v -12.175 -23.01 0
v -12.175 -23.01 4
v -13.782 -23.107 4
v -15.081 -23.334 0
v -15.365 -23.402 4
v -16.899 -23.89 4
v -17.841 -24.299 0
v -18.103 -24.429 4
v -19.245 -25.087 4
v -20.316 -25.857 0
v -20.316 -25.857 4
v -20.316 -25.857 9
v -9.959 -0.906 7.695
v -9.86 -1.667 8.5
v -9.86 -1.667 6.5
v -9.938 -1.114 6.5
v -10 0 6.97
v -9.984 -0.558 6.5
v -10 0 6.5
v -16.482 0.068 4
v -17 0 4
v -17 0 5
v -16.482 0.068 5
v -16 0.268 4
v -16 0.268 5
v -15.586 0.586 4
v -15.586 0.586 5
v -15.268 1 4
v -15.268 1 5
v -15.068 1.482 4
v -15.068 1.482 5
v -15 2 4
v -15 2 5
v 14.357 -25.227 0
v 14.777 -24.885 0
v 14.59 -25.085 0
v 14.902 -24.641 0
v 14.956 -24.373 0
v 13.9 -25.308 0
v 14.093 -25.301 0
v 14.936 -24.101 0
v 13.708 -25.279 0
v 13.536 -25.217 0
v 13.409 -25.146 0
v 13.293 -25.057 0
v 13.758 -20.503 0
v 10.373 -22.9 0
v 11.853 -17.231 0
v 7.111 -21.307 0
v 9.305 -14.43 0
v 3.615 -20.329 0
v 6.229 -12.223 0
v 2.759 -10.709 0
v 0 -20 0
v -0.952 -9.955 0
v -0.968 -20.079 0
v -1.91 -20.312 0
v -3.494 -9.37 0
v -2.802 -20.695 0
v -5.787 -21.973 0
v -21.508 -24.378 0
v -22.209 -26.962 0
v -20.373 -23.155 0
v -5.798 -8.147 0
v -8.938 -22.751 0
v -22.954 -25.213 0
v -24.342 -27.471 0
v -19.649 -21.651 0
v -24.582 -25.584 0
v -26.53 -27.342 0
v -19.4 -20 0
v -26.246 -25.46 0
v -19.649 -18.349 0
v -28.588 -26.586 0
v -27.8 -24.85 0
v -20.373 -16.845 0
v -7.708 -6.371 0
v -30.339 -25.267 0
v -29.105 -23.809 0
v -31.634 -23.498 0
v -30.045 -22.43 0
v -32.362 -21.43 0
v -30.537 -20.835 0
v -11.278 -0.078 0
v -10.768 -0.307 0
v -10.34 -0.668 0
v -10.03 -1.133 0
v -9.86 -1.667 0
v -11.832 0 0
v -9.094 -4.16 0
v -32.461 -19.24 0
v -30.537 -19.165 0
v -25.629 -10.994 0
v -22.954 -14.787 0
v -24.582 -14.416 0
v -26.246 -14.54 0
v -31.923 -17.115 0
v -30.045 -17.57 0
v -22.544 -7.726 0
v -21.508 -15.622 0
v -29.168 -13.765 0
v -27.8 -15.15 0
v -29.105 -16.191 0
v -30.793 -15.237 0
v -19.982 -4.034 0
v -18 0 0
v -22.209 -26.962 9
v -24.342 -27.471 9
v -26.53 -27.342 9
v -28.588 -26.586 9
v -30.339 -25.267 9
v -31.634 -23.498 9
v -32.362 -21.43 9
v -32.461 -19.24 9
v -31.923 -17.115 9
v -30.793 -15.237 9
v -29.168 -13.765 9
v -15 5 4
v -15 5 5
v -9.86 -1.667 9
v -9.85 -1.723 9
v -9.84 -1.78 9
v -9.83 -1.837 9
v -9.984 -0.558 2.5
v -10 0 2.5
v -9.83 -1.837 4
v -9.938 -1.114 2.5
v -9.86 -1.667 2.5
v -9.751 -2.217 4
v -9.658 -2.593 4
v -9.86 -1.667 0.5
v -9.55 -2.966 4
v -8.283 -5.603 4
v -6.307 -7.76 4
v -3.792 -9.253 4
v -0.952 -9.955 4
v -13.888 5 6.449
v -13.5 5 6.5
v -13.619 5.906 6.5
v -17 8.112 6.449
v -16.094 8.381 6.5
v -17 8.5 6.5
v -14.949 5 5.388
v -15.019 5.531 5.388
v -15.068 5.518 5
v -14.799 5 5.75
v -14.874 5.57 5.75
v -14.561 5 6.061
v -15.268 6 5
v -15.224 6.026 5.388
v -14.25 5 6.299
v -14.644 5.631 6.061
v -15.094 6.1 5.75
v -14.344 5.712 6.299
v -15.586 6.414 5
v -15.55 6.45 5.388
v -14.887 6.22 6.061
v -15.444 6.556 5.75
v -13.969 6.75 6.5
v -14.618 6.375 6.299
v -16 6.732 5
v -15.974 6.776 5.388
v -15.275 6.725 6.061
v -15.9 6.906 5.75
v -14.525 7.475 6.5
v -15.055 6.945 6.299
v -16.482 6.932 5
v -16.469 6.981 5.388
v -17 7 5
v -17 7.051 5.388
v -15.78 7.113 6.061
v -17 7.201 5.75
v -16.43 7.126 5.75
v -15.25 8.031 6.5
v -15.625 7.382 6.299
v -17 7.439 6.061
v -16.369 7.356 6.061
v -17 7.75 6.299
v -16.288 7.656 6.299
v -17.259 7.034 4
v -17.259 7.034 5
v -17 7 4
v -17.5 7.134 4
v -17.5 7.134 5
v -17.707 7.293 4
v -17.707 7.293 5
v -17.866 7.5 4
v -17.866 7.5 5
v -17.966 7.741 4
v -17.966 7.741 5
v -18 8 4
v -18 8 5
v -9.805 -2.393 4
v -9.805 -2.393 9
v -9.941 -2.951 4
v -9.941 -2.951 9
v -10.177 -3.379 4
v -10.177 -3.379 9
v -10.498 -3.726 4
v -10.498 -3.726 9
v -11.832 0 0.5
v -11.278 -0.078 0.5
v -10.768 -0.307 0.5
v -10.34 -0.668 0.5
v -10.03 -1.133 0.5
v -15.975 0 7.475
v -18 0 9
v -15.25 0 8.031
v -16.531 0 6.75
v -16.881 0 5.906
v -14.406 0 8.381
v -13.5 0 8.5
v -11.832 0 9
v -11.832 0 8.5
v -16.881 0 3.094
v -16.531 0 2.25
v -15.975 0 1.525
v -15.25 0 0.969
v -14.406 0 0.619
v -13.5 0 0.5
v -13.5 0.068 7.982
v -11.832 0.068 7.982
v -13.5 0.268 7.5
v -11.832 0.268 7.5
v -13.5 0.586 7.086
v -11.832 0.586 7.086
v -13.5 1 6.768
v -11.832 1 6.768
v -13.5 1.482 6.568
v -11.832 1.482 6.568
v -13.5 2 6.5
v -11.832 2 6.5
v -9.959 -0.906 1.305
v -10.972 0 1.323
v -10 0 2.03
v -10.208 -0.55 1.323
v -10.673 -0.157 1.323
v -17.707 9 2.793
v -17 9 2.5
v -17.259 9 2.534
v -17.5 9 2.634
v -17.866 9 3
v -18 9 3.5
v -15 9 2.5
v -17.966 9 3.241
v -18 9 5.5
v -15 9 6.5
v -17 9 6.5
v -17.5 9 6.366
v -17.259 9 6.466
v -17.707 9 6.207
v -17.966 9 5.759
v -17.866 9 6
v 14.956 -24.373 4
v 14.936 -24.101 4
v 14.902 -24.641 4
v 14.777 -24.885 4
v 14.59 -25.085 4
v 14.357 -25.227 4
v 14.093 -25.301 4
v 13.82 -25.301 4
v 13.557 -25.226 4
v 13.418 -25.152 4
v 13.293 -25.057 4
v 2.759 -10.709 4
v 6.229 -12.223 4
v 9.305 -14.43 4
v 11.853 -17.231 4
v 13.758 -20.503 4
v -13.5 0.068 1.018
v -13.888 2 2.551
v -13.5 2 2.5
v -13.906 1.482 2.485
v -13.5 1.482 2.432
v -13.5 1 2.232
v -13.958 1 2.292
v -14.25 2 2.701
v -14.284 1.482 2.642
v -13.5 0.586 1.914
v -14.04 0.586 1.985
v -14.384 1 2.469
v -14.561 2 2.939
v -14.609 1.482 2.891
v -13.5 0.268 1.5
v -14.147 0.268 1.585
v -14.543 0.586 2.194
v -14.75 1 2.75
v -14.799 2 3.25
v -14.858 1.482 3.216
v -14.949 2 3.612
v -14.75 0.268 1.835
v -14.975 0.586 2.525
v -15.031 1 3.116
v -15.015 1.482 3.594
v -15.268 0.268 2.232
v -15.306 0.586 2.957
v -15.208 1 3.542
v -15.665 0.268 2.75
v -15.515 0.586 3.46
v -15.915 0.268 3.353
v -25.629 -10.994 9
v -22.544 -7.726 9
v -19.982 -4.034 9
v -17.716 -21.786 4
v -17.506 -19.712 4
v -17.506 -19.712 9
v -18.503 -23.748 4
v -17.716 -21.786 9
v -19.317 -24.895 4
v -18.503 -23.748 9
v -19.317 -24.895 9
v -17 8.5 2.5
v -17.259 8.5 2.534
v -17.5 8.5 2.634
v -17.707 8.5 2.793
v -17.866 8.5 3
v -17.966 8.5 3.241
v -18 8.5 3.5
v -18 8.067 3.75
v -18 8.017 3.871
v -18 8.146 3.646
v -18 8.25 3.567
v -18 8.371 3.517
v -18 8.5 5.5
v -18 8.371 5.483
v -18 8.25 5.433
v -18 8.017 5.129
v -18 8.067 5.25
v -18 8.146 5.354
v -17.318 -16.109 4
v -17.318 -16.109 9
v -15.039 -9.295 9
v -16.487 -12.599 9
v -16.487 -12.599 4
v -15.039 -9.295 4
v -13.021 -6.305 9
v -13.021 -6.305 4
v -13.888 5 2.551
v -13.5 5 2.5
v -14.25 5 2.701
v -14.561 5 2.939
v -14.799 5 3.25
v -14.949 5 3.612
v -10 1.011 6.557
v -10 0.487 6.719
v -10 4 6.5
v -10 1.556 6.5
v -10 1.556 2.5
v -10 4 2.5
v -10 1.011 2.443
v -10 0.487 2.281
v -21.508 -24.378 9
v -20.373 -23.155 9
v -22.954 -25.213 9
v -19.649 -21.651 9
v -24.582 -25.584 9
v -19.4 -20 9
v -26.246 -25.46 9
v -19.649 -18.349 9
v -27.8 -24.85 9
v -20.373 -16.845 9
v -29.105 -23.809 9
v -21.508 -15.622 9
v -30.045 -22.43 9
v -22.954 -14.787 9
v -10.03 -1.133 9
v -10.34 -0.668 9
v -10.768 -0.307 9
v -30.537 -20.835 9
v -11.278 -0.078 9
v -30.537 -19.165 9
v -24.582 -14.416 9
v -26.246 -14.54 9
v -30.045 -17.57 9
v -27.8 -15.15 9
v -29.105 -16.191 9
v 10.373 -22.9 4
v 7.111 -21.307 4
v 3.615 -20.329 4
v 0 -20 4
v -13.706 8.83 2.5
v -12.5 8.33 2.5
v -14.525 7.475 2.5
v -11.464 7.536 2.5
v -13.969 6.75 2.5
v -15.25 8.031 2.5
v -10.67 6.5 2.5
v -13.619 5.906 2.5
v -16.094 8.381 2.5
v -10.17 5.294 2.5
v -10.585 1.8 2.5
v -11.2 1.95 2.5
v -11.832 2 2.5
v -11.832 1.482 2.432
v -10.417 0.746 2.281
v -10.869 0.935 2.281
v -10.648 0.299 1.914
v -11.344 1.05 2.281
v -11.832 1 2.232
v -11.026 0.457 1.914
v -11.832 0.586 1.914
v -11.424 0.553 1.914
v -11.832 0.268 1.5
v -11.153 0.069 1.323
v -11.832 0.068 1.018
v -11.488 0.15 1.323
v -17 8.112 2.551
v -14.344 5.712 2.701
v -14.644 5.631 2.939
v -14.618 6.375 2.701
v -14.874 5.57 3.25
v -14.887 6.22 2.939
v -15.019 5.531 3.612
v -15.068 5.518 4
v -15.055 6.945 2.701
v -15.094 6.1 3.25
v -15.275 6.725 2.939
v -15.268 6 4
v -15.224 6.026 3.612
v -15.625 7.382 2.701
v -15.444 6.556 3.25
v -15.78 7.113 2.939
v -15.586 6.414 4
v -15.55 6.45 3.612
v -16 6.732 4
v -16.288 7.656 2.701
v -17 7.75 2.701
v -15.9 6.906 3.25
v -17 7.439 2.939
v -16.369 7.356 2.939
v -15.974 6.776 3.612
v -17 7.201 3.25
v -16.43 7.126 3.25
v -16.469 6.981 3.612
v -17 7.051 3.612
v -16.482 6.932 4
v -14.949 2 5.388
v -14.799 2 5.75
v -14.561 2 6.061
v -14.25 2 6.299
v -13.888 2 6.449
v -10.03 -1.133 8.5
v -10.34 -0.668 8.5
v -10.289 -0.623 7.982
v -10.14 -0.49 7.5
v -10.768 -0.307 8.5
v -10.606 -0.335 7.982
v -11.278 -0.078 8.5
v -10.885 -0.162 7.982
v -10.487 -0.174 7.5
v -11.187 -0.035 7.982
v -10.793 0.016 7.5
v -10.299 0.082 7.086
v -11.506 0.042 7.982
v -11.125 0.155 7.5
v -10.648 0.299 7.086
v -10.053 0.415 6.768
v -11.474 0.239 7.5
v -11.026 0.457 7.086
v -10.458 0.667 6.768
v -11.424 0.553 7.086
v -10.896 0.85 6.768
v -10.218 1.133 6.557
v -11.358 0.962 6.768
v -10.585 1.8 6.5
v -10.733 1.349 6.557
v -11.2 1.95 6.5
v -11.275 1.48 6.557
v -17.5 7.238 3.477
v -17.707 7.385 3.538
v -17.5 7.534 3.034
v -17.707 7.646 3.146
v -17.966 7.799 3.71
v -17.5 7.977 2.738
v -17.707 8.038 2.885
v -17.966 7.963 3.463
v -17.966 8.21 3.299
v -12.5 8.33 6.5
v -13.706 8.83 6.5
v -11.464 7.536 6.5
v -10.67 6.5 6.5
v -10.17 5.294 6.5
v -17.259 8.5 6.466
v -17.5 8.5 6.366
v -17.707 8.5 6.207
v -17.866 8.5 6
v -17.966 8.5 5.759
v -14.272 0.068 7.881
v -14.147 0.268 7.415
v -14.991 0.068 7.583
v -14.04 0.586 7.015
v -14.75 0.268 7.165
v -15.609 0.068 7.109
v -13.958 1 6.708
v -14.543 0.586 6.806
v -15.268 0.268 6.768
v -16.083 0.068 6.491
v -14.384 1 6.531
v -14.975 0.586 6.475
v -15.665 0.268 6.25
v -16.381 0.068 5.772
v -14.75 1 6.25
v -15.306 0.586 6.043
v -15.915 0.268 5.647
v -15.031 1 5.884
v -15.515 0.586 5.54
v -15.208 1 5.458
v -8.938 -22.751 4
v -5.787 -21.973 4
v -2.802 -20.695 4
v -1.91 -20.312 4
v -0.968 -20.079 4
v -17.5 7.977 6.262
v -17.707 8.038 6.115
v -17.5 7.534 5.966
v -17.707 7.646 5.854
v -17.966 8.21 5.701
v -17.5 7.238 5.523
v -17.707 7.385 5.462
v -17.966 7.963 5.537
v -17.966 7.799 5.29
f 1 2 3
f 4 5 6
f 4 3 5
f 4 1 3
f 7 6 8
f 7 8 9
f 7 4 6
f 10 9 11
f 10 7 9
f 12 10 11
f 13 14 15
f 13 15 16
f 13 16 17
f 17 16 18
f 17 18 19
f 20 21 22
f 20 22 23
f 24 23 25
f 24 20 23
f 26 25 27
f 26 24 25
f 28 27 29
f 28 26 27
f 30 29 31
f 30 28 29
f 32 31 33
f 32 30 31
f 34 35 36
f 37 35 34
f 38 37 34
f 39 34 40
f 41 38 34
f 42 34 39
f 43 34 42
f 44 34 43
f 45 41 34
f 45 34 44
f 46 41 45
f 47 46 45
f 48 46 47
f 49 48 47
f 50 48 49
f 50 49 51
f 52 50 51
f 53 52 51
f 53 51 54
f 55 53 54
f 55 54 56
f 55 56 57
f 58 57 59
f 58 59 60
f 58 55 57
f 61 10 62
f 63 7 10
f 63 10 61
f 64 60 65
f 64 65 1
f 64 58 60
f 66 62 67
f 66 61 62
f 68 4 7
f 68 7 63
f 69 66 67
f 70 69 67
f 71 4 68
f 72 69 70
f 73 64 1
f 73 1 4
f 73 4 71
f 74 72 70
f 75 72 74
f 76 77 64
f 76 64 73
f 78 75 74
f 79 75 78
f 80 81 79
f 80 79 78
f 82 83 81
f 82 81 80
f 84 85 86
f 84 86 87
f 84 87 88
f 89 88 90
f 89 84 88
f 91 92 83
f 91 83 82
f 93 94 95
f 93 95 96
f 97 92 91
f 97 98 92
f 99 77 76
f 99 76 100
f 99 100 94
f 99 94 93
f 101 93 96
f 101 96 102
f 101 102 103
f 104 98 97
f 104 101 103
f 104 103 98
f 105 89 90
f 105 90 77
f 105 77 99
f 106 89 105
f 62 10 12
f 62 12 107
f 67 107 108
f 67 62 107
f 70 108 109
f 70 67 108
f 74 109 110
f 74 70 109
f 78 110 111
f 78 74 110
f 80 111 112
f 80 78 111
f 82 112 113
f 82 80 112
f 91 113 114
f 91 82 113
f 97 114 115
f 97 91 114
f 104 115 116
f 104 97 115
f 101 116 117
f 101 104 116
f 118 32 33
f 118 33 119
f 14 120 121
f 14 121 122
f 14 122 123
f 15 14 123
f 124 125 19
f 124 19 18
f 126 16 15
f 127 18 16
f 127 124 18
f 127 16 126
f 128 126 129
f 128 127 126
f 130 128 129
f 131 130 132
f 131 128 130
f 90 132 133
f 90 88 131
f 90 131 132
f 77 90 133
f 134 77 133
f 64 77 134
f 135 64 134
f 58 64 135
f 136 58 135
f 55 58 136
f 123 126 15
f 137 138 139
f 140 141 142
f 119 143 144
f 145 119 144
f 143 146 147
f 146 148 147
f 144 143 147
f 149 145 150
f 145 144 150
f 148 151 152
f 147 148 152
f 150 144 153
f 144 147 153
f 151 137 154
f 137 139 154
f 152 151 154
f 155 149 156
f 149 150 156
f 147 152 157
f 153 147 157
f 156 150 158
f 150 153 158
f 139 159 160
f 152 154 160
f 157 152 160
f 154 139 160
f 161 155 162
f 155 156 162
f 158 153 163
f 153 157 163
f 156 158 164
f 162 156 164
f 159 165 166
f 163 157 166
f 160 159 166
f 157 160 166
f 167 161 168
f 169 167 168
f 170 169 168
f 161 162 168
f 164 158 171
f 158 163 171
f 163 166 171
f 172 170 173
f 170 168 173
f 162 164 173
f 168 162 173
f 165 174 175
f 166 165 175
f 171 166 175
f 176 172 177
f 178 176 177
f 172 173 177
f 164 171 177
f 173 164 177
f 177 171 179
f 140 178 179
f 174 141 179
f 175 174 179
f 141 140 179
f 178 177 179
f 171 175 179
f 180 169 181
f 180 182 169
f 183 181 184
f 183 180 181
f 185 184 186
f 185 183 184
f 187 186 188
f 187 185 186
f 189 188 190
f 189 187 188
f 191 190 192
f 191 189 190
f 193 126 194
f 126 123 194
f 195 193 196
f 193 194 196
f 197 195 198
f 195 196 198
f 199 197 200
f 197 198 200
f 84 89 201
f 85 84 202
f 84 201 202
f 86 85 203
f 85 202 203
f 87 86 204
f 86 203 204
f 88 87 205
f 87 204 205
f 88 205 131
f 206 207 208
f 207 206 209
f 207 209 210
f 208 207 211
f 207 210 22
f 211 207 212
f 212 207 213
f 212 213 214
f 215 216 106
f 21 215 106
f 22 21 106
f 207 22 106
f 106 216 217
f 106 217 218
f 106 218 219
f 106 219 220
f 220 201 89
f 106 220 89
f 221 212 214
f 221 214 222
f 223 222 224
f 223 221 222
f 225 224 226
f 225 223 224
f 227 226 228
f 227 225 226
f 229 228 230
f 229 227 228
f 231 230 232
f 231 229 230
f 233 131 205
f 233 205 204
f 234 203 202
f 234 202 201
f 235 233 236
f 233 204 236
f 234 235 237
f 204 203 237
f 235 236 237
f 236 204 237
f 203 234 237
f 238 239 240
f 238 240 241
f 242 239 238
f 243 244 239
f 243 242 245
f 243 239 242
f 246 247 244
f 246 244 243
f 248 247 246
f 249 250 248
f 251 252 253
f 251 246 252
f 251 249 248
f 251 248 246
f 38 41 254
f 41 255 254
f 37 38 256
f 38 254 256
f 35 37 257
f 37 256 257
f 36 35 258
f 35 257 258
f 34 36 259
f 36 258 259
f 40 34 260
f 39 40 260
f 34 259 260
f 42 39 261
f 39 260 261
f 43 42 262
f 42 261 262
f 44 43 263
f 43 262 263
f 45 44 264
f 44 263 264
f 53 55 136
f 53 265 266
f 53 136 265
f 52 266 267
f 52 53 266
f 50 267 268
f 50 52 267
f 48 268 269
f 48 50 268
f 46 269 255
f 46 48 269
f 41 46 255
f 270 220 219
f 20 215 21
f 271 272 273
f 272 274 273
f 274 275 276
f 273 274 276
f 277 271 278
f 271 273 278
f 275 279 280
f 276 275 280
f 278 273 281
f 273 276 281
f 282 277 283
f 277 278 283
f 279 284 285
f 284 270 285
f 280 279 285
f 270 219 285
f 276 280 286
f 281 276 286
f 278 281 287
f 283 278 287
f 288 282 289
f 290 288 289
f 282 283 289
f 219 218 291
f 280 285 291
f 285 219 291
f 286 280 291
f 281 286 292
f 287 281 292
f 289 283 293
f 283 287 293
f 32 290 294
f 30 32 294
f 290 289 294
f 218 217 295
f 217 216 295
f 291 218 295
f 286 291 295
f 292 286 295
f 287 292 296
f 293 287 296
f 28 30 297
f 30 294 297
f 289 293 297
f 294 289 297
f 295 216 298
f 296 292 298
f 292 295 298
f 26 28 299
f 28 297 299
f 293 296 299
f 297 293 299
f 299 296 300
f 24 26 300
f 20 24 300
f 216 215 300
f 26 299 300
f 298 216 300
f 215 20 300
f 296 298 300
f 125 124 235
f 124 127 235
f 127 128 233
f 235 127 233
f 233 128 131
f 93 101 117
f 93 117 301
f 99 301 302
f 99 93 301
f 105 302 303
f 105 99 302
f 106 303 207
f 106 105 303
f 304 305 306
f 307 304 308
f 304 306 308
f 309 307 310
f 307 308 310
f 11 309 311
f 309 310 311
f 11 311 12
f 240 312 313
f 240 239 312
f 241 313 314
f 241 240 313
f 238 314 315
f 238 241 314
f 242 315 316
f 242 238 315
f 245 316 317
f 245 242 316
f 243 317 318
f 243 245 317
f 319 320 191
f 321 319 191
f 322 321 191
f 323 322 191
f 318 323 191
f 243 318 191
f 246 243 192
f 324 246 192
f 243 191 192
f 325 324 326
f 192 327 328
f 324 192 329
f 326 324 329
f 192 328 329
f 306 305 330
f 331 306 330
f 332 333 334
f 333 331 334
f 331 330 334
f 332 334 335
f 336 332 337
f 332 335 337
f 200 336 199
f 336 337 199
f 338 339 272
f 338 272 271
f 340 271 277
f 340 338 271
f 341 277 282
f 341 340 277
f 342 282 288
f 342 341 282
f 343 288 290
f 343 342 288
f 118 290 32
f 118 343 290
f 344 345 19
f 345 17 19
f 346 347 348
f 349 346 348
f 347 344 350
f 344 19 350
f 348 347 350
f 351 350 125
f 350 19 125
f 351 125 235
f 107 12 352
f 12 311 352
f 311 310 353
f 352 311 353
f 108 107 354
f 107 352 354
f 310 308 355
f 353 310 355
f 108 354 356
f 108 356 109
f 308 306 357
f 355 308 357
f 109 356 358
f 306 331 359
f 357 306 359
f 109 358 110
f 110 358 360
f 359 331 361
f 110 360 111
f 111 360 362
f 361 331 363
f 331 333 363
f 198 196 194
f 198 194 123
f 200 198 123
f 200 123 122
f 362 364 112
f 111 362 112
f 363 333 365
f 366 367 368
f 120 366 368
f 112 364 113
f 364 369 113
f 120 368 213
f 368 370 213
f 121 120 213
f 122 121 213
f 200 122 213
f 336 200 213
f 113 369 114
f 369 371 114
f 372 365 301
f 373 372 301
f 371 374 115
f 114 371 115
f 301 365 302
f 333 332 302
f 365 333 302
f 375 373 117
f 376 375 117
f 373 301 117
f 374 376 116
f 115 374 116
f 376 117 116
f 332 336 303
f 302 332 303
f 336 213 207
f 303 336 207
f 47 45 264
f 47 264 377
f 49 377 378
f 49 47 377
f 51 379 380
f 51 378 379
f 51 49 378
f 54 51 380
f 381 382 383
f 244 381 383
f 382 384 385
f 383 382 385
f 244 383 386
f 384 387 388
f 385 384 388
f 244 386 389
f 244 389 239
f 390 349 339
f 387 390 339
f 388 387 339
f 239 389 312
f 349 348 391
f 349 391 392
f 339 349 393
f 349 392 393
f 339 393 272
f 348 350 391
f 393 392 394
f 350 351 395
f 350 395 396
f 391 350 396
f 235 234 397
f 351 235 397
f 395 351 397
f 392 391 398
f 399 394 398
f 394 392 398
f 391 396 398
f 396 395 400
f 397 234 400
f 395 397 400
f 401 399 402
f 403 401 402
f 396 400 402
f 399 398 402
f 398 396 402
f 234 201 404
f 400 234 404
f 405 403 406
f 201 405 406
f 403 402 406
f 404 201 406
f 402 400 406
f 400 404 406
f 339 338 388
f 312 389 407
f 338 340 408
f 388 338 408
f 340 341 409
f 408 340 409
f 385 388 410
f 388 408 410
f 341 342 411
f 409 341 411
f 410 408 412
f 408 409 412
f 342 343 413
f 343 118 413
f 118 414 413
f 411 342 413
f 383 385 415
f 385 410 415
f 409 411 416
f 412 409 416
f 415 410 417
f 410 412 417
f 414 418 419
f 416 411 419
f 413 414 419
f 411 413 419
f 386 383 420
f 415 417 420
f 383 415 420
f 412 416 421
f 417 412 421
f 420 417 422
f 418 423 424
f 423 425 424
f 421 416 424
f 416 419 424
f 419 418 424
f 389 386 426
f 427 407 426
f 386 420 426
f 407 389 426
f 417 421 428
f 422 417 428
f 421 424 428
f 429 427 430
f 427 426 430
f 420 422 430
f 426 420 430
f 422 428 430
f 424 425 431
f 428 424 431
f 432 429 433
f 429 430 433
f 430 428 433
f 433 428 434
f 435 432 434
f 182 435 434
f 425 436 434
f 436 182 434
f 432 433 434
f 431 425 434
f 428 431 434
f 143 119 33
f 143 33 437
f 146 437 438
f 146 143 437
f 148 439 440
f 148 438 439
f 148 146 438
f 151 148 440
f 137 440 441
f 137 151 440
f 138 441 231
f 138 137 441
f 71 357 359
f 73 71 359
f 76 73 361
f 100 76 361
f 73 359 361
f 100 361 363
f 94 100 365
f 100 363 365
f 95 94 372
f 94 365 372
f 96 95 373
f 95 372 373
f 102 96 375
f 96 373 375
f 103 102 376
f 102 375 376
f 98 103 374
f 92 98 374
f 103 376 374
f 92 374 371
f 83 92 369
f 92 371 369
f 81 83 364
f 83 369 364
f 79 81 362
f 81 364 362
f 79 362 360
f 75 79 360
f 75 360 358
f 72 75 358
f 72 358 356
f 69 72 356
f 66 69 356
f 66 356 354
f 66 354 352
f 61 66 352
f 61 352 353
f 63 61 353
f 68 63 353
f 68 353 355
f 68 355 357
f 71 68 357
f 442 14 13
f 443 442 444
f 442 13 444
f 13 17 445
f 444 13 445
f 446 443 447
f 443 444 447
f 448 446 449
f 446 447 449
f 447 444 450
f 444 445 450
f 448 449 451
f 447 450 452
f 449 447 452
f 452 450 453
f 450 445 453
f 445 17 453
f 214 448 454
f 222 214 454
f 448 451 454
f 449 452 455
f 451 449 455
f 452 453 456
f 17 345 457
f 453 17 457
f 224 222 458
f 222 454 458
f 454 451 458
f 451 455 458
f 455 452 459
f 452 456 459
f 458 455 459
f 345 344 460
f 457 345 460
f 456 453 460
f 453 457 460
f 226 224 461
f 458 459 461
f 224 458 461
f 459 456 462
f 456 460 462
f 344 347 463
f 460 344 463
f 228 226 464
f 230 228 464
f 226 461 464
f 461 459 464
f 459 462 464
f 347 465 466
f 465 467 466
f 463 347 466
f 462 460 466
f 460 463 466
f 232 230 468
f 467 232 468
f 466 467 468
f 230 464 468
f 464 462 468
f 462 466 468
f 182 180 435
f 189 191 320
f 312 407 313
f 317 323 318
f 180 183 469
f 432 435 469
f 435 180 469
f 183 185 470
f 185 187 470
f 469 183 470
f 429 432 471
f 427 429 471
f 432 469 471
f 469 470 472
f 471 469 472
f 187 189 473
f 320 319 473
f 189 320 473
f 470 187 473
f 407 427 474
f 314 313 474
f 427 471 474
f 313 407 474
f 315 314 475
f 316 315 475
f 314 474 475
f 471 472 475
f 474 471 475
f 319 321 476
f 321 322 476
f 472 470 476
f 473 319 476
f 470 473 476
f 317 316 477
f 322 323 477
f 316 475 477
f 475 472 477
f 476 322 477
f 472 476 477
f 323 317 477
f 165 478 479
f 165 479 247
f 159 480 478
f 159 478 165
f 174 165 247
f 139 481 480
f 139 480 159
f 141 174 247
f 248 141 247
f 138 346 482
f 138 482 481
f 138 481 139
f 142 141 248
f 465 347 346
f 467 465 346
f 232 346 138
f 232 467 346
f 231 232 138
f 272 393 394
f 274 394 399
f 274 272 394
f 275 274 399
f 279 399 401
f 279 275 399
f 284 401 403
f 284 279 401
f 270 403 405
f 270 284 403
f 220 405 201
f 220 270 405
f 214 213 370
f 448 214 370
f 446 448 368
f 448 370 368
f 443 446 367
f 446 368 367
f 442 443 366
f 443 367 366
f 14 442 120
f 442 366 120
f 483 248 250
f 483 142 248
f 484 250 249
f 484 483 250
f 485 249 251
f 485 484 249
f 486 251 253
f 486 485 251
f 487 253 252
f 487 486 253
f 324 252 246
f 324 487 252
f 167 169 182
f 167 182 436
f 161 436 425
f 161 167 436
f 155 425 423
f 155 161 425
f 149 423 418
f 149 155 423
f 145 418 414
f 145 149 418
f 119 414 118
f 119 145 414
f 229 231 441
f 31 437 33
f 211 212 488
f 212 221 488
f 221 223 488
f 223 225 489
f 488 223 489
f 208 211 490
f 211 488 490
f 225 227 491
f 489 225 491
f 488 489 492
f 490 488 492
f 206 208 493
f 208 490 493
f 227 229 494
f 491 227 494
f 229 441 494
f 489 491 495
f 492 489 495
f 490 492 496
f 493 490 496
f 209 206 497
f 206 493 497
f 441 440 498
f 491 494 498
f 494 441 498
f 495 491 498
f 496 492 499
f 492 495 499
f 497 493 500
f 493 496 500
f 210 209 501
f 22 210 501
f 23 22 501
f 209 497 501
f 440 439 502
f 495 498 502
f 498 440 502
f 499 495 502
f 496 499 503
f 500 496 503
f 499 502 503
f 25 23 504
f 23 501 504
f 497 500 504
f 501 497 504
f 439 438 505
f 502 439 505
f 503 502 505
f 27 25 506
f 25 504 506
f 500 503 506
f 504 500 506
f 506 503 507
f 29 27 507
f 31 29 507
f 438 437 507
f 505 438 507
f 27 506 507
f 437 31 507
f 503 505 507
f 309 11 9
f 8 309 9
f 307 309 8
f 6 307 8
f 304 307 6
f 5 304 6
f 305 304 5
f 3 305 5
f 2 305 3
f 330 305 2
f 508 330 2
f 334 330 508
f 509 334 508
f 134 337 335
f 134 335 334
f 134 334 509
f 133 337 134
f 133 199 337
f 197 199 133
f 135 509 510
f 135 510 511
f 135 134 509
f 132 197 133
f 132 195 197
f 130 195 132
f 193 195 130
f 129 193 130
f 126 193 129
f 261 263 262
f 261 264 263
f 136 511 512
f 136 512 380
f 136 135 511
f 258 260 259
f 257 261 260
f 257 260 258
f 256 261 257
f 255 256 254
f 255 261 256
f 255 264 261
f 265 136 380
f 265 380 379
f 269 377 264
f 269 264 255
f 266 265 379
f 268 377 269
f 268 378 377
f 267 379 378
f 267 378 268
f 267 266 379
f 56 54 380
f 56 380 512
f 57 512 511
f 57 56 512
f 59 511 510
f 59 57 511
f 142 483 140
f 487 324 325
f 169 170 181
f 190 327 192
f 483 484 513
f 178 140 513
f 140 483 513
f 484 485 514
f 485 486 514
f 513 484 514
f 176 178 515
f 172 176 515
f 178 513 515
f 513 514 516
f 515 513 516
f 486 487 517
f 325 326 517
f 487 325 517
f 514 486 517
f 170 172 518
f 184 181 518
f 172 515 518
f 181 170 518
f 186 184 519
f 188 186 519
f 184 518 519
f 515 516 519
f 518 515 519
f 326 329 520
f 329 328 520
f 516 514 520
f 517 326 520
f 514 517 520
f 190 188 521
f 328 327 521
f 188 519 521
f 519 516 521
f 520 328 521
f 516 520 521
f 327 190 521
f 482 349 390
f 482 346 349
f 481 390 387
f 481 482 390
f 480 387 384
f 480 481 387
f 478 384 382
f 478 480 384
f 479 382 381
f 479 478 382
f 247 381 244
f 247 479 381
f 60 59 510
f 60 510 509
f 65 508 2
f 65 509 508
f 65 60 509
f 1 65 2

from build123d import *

# Parameters (mm, degrees)
EXTRUDE_1_DEPTH     = 9
CUT_EXTRUDE_START   = -5
CUT_EXTRUDE_1_DEPTH = 5
SKETCH_12_W         = 2.5
SKETCH_12_H         = 7
CUT_EXTRUDE_3_DEPTH = 42.911887352
FILLET_11_R         = 2
FILLET_1_R          = 1
SKETCH_10_W         = 8
SKETCH_10_H         = 4
EXTRUDE_3_DEPTH     = 2
FILLET_5_R          = 5
FILLET_10_R         = 7.5
FILLET_14_R         = 2
FILLET_15_R         = 1.5
FILLET_16_R         = 2
FILLET_17_R         = 1
FILLET_18_R         = 2
SKETCH_11_R         = 5.6
CUT_EXTRUDE_2_DEPTH = 44.514365603


# Some blends are built 0.0001 mm under size
with BuildPart() as part:
    # Эскиз2 → Бобышка-Вытянуть1 (new body)
    with BuildSketch(Plane.XY):
        with BuildLine():
            Line((-18, 0), (-15, 0))
            Line((-15, 0), (-15, 7))
            Line((-15, 7), (-10, 7))
            Line((-10, 7), (-10, 0))
            ThreePointArc((-10, 0), (-7.39984978, -6.726233956), (-0.951555354, -9.954624172))
            ThreePointArc((-0.951555354, -9.954624172), (10.407523967, -15.498539394), (15.320888862, -27.144247806))
            ThreePointArc((15.320888862, -27.144247806), (8.452365235, -21.873844259), (0, -20))
            ThreePointArc((0, -20), (-1.44344914, -20.176216472), (-2.802111775, -20.69451514))
            ThreePointArc((-2.802111775, -20.69451514), (-7.346697493, -22.426064476), (-12.174852362, -23.009539415))
            ThreePointArc((-12.174852362, -23.009539415), (-16.488233618, -23.738589268), (-20.315570084, -25.857142338))
            ThreePointArc((-20.315570084, -25.857142338), (-31.05163084, -24.430323259), (-29.168151763, -13.764896883))
            ThreePointArc((-29.168151763, -13.764896883), (-22.544234788, -7.726123715), (-18, 0))
        make_face()
    extrude(amount=EXTRUDE_1_DEPTH)

    # Эскиз6 → Вырез-Вытянуть1 (cut)
    with BuildSketch(Plane.XY.offset(9).offset(CUT_EXTRUDE_START)):
        with BuildLine():
            ThreePointArc((-9.55, -2.96605799), (-16.390256677, -12.316180922), (-16.898984287, -23.890078556))
            ThreePointArc((-16.898984287, -23.890078556), (-14.577958647, -23.229625817), (-12.174852362, -23.009539415))
            ThreePointArc((-12.174852362, -23.009539415), (-7.346697493, -22.426064476), (-2.802111775, -20.69451514))
            ThreePointArc((-2.802111775, -20.69451514), (-1.44344914, -20.176216472), (0, -20))
            ThreePointArc((0, -20), (8.452365235, -21.873844259), (15.320888862, -27.144247806))
            ThreePointArc((15.320888862, -27.144247806), (10.407523967, -15.498539394), (-0.951555354, -9.954624172))
            ThreePointArc((-0.951555354, -9.954624172), (-6.307192762, -7.760110789), (-9.55, -2.96605799))
        make_face()
    extrude(amount=CUT_EXTRUDE_1_DEPTH, mode=Mode.SUBTRACT)

    # Эскиз12 → Вырез-Вытянуть3 (cut, through all)
    with BuildSketch(Plane.ZY.offset(15)):
        with Locations((1.25, 3.5)):
            Rectangle(SKETCH_12_W, SKETCH_12_H)
        with Locations((7.75, 3.5)):
            Rectangle(SKETCH_12_W, SKETCH_12_H)
    extrude(amount=-CUT_EXTRUDE_3_DEPTH, mode=Mode.SUBTRACT)

    # Скругление11
    fillet_11_edges = [part.edges().sort_by_distance(p)[0] for p in [
        (-10, 0, 7.75),
        (-10, 0, 1.25),
    ]]
    fillet(fillet_11_edges, radius=FILLET_11_R)

    # Скругление1
    fillet_1_edges = [part.edges().sort_by_distance(p)[0] for p in [
        (15.320888862, -27.144247806, 2),
    ]]
    fillet(fillet_1_edges, radius=FILLET_1_R)

    # Эскиз10 → Бобышка-Вытянуть3 (add)
    with BuildSketch(Plane(origin=(0, 7, 0), x_dir=(-1, 0, 0), z_dir=(0, 1, 0))):
        with Locations((14, 4.5)):
            Rectangle(SKETCH_10_W, SKETCH_10_H)
    extrude(amount=EXTRUDE_3_DEPTH)

    # Скругление5
    fillet_5_edges = [part.edges().sort_by_distance(p)[0] for p in [
        (-10, 9, 4.5),
    ]]
    fillet(fillet_5_edges, radius=FILLET_5_R)

    # Скругление10
    fillet_10_edges = [part.edges().sort_by_distance(p)[0] for p in [
        (-16.898984287, -23.890078556, 6.5),
    ]]
    fillet(fillet_10_edges, radius=FILLET_10_R - 0.0001)  # a hair under: the kernel refuses the full size

    # Скругление14
    fillet_14_edges = [part.edges().sort_by_distance(p)[0] for p in [
        (-15, 7, 4.5),
    ]]
    fillet(fillet_14_edges, radius=FILLET_14_R)

    # Скругление15
    fillet_15_edges = [part.edges().sort_by_distance(p)[0] for p in [
        (-17.5, 7, 6.5),
        (-15, 2.5, 6.5),
        (-17.5, 7, 2.5),
        (-15.585786438, 6.414213562, 2.5),
        (-15.585786438, 6.414213562, 6.5),
        (-15, 2.5, 2.5),
    ]]
    fillet(fillet_15_edges, radius=FILLET_15_R)

    # Скругление16
    # the kernel refuses this fillet: 2 mm, written as the material it adds along each edge
    with BuildSketch(Plane(origin=(-11.832159566, -2, 6.5), x_dir=(-0.6907726827654878, -0.7230719886325089, 0), z_dir=(-0.7230719886325089, 0.6907726827654878, 0))) as fillet_16_piece_1_section:
        with BuildLine():
            CenterArc((2 + FILLET_16_R, FILLET_16_R), FILLET_16_R, 180, 90)
            Line((2, FILLET_16_R), (2, 0))
            Line((2, 0), (2 + FILLET_16_R, 0))
        make_face()
    fillet_16_piece_1 = revolve(axis=Axis((-11.832159566, -2, 6.5), (0, 0, 1)), revolution_arc=223.691304566, mode=Mode.PRIVATE)
    fillet_16_piece_1 = split(fillet_16_piece_1, bisect_by=Plane(origin=(-9.962064569, 0, 7.231915875), z_dir=(0, -1, 0)), keep=Keep.TOP, mode=Mode.PRIVATE)
    fillet_16_piece_1 = fillet_16_piece_1 - Plane(origin=(0, 0, 7.231915875), x_dir=(-1, 0, 0), z_dir=(0, 0, -1)) * Cylinder(10, 17, mode=Mode.PRIVATE)
    fillet_16_piece_1 = fillet_16_piece_1 - Plane(origin=(2.479707116, -18.943734501, 7.231915875), x_dir=(-0.6014853558135568, 0.7988838255602869, 0), z_dir=(0, 0, -1)) * Cylinder(20, 17, mode=Mode.PRIVATE)
    add(fillet_16_piece_1)
    with BuildSketch(Plane(origin=(-11.832159566, -2, 6.5), x_dir=(-0.6907726827654878, -0.7230719886325089, 0), z_dir=(-0.7230719886325089, 0.6907726827654878, 0))) as fillet_16_piece_2_section:
        with BuildLine():
            CenterArc((2 + FILLET_16_R, FILLET_16_R), FILLET_16_R, 180, 90)
            Line((2, FILLET_16_R), (2, 0))
            Line((2, 0), (2 + FILLET_16_R, 0))
        make_face()
    fillet_16_piece_2 = revolve(axis=Axis((-11.832159566, -2, 6.5), (0, 0, 1)), revolution_arc=223.691304566, mode=Mode.PRIVATE)
    fillet_16_piece_2 = split(fillet_16_piece_2, bisect_by=Plane(origin=(-11.088968436, 0, 6.841402023), z_dir=(0, 1, 0)), keep=Keep.TOP, mode=Mode.PRIVATE)
    fillet_16_piece_2 = split(fillet_16_piece_2, bisect_by=Plane(origin=(-10, 0.441530369, 6.841402023), z_dir=(-1, 0, 0)), keep=Keep.TOP, mode=Mode.PRIVATE)
    add(fillet_16_piece_2)
    with BuildSketch(Plane(origin=(-13.5, 0, 6.5), x_dir=(0, 0, 1), z_dir=(1, 0, 0))) as fillet_16_piece_3:
        with BuildLine():
            CenterArc((FILLET_16_R, -FILLET_16_R), FILLET_16_R, 90, 90)
            Line((0, -FILLET_16_R), (0, 0))
            Line((0, 0), (FILLET_16_R, 0))
        make_face()
    extrude(amount=1.667840434)
    with BuildSketch(Plane(origin=(-11.832159566, -2, 2.5), x_dir=(-0.6907726827654875, -0.7230719886325091, 0), z_dir=(-0.7230719886325091, 0.6907726827654875, 0))) as fillet_16_piece_4_section:
        with BuildLine():
            CenterArc((2 + FILLET_16_R, -FILLET_16_R), FILLET_16_R, 90, 90)
            Line((2, -FILLET_16_R), (2, 0))
            Line((2, 0), (2 + FILLET_16_R, 0))
        make_face()
    fillet_16_piece_4 = revolve(axis=Axis((-11.832159566, -2, 2.5), (0, 0, 1)), revolution_arc=223.691304566, mode=Mode.PRIVATE)
    fillet_16_piece_4 = split(fillet_16_piece_4, bisect_by=Plane(origin=(-9.962064569, 0, 1.768084125), z_dir=(0, -1, 0)), keep=Keep.TOP, mode=Mode.PRIVATE)
    fillet_16_piece_4 = fillet_16_piece_4 - Plane(origin=(0, 0, 1.768084125), x_dir=(-1, 0, 0), z_dir=(0, 0, -1)) * Cylinder(10, 17, mode=Mode.PRIVATE)
    add(fillet_16_piece_4)
    with BuildSketch(Plane(origin=(-11.832159566, -2, 2.5), x_dir=(-0.6907726827654875, -0.7230719886325091, 0), z_dir=(-0.7230719886325091, 0.6907726827654875, 0))) as fillet_16_piece_5_section:
        with BuildLine():
            CenterArc((2 + FILLET_16_R, -FILLET_16_R), FILLET_16_R, 90, 90)
            Line((2, -FILLET_16_R), (2, 0))
            Line((2, 0), (2 + FILLET_16_R, 0))
        make_face()
    fillet_16_piece_5 = revolve(axis=Axis((-11.832159566, -2, 2.5), (0, 0, 1)), revolution_arc=223.691304566, mode=Mode.PRIVATE)
    fillet_16_piece_5 = split(fillet_16_piece_5, bisect_by=Plane(origin=(-10, 0.441530341, 2.15859789), z_dir=(-1, 0, 0)), keep=Keep.TOP, mode=Mode.PRIVATE)
    add(fillet_16_piece_5)
    with BuildSketch(Plane(origin=(-13.5, 0, 2.5), x_dir=(0, 0, -1), z_dir=(1, 0, 0))) as fillet_16_piece_6:
        with BuildLine():
            CenterArc((FILLET_16_R, FILLET_16_R), FILLET_16_R, 180, 90)
            Line((0, FILLET_16_R), (0, 0))
            Line((0, 0), (FILLET_16_R, 0))
        make_face()
    extrude(amount=1.667840434)
    with BuildSketch(Plane(origin=(-13.5, 0, 4), x_dir=(0, 0, -1), z_dir=(1, 0, 0))) as fillet_16_piece_7:
        with BuildLine():
            CenterArc((1.5 + FILLET_16_R, FILLET_16_R), FILLET_16_R, 180, 90)
            Line((1.5 + FILLET_16_R, 0), (1.5, 0))
            Line((1.5, 0), (1.5, FILLET_16_R))
        make_face()
    revolve(axis=Axis((-13.5, 0, 4), (0, 1, 0)), revolution_arc=90)
    with BuildSketch(Plane(origin=(-15, 0, 4), x_dir=(0, 1, 0), z_dir=(0, 0, 1))) as fillet_16_piece_8:
        with BuildLine():
            CenterArc((FILLET_16_R, FILLET_16_R), FILLET_16_R, 180, 90)
            Line((0, FILLET_16_R), (0, 0))
            Line((0, 0), (FILLET_16_R, 0))
        make_face()
    extrude(amount=1)
    with BuildSketch(Plane(origin=(-13.5, 0, 5), x_dir=(0, 0, 1), z_dir=(1, 0, 0))) as fillet_16_piece_9:
        with BuildLine():
            CenterArc((1.5 + FILLET_16_R, -FILLET_16_R), FILLET_16_R, 90, 90)
            Line((1.5 + FILLET_16_R, 0), (1.5, 0))
            Line((1.5, 0), (1.5, -FILLET_16_R))
        make_face()
    revolve(axis=Axis((-13.5, 0, 5), (0, -1, 0)), revolution_arc=90)

    # Скругление17
    fillet_17_edges = [part.edges().sort_by_distance(p)[0] for p in [
        (-18, 8.75, 2.5),
        (-18, 7.439339828, 2.939339828),
        (-18, 7, 4.5),
        (-18, 8.75, 6.5),
        (-18, 7.439339828, 6.060660172),
    ]]
    fillet(fillet_17_edges, radius=FILLET_17_R - 0.0001)  # a hair under: the kernel refuses the full size

    # Скругление18
    fillet_18_edges = [part.edges().sort_by_distance(p)[0] for p in [
        (-9.55, -2.96605799, 5.25),
    ]]
    fillet(fillet_18_edges, radius=FILLET_18_R)

    # Эскиз11 → Вырез-Вытянуть2 (cut, through all)
    with BuildSketch(Plane.XY.offset(9)):
        with Locations((-25, -20)):
            Circle(SKETCH_11_R)
    extrude(amount=-CUT_EXTRUDE_2_DEPTH, mode=Mode.SUBTRACT)


solid = part.part
